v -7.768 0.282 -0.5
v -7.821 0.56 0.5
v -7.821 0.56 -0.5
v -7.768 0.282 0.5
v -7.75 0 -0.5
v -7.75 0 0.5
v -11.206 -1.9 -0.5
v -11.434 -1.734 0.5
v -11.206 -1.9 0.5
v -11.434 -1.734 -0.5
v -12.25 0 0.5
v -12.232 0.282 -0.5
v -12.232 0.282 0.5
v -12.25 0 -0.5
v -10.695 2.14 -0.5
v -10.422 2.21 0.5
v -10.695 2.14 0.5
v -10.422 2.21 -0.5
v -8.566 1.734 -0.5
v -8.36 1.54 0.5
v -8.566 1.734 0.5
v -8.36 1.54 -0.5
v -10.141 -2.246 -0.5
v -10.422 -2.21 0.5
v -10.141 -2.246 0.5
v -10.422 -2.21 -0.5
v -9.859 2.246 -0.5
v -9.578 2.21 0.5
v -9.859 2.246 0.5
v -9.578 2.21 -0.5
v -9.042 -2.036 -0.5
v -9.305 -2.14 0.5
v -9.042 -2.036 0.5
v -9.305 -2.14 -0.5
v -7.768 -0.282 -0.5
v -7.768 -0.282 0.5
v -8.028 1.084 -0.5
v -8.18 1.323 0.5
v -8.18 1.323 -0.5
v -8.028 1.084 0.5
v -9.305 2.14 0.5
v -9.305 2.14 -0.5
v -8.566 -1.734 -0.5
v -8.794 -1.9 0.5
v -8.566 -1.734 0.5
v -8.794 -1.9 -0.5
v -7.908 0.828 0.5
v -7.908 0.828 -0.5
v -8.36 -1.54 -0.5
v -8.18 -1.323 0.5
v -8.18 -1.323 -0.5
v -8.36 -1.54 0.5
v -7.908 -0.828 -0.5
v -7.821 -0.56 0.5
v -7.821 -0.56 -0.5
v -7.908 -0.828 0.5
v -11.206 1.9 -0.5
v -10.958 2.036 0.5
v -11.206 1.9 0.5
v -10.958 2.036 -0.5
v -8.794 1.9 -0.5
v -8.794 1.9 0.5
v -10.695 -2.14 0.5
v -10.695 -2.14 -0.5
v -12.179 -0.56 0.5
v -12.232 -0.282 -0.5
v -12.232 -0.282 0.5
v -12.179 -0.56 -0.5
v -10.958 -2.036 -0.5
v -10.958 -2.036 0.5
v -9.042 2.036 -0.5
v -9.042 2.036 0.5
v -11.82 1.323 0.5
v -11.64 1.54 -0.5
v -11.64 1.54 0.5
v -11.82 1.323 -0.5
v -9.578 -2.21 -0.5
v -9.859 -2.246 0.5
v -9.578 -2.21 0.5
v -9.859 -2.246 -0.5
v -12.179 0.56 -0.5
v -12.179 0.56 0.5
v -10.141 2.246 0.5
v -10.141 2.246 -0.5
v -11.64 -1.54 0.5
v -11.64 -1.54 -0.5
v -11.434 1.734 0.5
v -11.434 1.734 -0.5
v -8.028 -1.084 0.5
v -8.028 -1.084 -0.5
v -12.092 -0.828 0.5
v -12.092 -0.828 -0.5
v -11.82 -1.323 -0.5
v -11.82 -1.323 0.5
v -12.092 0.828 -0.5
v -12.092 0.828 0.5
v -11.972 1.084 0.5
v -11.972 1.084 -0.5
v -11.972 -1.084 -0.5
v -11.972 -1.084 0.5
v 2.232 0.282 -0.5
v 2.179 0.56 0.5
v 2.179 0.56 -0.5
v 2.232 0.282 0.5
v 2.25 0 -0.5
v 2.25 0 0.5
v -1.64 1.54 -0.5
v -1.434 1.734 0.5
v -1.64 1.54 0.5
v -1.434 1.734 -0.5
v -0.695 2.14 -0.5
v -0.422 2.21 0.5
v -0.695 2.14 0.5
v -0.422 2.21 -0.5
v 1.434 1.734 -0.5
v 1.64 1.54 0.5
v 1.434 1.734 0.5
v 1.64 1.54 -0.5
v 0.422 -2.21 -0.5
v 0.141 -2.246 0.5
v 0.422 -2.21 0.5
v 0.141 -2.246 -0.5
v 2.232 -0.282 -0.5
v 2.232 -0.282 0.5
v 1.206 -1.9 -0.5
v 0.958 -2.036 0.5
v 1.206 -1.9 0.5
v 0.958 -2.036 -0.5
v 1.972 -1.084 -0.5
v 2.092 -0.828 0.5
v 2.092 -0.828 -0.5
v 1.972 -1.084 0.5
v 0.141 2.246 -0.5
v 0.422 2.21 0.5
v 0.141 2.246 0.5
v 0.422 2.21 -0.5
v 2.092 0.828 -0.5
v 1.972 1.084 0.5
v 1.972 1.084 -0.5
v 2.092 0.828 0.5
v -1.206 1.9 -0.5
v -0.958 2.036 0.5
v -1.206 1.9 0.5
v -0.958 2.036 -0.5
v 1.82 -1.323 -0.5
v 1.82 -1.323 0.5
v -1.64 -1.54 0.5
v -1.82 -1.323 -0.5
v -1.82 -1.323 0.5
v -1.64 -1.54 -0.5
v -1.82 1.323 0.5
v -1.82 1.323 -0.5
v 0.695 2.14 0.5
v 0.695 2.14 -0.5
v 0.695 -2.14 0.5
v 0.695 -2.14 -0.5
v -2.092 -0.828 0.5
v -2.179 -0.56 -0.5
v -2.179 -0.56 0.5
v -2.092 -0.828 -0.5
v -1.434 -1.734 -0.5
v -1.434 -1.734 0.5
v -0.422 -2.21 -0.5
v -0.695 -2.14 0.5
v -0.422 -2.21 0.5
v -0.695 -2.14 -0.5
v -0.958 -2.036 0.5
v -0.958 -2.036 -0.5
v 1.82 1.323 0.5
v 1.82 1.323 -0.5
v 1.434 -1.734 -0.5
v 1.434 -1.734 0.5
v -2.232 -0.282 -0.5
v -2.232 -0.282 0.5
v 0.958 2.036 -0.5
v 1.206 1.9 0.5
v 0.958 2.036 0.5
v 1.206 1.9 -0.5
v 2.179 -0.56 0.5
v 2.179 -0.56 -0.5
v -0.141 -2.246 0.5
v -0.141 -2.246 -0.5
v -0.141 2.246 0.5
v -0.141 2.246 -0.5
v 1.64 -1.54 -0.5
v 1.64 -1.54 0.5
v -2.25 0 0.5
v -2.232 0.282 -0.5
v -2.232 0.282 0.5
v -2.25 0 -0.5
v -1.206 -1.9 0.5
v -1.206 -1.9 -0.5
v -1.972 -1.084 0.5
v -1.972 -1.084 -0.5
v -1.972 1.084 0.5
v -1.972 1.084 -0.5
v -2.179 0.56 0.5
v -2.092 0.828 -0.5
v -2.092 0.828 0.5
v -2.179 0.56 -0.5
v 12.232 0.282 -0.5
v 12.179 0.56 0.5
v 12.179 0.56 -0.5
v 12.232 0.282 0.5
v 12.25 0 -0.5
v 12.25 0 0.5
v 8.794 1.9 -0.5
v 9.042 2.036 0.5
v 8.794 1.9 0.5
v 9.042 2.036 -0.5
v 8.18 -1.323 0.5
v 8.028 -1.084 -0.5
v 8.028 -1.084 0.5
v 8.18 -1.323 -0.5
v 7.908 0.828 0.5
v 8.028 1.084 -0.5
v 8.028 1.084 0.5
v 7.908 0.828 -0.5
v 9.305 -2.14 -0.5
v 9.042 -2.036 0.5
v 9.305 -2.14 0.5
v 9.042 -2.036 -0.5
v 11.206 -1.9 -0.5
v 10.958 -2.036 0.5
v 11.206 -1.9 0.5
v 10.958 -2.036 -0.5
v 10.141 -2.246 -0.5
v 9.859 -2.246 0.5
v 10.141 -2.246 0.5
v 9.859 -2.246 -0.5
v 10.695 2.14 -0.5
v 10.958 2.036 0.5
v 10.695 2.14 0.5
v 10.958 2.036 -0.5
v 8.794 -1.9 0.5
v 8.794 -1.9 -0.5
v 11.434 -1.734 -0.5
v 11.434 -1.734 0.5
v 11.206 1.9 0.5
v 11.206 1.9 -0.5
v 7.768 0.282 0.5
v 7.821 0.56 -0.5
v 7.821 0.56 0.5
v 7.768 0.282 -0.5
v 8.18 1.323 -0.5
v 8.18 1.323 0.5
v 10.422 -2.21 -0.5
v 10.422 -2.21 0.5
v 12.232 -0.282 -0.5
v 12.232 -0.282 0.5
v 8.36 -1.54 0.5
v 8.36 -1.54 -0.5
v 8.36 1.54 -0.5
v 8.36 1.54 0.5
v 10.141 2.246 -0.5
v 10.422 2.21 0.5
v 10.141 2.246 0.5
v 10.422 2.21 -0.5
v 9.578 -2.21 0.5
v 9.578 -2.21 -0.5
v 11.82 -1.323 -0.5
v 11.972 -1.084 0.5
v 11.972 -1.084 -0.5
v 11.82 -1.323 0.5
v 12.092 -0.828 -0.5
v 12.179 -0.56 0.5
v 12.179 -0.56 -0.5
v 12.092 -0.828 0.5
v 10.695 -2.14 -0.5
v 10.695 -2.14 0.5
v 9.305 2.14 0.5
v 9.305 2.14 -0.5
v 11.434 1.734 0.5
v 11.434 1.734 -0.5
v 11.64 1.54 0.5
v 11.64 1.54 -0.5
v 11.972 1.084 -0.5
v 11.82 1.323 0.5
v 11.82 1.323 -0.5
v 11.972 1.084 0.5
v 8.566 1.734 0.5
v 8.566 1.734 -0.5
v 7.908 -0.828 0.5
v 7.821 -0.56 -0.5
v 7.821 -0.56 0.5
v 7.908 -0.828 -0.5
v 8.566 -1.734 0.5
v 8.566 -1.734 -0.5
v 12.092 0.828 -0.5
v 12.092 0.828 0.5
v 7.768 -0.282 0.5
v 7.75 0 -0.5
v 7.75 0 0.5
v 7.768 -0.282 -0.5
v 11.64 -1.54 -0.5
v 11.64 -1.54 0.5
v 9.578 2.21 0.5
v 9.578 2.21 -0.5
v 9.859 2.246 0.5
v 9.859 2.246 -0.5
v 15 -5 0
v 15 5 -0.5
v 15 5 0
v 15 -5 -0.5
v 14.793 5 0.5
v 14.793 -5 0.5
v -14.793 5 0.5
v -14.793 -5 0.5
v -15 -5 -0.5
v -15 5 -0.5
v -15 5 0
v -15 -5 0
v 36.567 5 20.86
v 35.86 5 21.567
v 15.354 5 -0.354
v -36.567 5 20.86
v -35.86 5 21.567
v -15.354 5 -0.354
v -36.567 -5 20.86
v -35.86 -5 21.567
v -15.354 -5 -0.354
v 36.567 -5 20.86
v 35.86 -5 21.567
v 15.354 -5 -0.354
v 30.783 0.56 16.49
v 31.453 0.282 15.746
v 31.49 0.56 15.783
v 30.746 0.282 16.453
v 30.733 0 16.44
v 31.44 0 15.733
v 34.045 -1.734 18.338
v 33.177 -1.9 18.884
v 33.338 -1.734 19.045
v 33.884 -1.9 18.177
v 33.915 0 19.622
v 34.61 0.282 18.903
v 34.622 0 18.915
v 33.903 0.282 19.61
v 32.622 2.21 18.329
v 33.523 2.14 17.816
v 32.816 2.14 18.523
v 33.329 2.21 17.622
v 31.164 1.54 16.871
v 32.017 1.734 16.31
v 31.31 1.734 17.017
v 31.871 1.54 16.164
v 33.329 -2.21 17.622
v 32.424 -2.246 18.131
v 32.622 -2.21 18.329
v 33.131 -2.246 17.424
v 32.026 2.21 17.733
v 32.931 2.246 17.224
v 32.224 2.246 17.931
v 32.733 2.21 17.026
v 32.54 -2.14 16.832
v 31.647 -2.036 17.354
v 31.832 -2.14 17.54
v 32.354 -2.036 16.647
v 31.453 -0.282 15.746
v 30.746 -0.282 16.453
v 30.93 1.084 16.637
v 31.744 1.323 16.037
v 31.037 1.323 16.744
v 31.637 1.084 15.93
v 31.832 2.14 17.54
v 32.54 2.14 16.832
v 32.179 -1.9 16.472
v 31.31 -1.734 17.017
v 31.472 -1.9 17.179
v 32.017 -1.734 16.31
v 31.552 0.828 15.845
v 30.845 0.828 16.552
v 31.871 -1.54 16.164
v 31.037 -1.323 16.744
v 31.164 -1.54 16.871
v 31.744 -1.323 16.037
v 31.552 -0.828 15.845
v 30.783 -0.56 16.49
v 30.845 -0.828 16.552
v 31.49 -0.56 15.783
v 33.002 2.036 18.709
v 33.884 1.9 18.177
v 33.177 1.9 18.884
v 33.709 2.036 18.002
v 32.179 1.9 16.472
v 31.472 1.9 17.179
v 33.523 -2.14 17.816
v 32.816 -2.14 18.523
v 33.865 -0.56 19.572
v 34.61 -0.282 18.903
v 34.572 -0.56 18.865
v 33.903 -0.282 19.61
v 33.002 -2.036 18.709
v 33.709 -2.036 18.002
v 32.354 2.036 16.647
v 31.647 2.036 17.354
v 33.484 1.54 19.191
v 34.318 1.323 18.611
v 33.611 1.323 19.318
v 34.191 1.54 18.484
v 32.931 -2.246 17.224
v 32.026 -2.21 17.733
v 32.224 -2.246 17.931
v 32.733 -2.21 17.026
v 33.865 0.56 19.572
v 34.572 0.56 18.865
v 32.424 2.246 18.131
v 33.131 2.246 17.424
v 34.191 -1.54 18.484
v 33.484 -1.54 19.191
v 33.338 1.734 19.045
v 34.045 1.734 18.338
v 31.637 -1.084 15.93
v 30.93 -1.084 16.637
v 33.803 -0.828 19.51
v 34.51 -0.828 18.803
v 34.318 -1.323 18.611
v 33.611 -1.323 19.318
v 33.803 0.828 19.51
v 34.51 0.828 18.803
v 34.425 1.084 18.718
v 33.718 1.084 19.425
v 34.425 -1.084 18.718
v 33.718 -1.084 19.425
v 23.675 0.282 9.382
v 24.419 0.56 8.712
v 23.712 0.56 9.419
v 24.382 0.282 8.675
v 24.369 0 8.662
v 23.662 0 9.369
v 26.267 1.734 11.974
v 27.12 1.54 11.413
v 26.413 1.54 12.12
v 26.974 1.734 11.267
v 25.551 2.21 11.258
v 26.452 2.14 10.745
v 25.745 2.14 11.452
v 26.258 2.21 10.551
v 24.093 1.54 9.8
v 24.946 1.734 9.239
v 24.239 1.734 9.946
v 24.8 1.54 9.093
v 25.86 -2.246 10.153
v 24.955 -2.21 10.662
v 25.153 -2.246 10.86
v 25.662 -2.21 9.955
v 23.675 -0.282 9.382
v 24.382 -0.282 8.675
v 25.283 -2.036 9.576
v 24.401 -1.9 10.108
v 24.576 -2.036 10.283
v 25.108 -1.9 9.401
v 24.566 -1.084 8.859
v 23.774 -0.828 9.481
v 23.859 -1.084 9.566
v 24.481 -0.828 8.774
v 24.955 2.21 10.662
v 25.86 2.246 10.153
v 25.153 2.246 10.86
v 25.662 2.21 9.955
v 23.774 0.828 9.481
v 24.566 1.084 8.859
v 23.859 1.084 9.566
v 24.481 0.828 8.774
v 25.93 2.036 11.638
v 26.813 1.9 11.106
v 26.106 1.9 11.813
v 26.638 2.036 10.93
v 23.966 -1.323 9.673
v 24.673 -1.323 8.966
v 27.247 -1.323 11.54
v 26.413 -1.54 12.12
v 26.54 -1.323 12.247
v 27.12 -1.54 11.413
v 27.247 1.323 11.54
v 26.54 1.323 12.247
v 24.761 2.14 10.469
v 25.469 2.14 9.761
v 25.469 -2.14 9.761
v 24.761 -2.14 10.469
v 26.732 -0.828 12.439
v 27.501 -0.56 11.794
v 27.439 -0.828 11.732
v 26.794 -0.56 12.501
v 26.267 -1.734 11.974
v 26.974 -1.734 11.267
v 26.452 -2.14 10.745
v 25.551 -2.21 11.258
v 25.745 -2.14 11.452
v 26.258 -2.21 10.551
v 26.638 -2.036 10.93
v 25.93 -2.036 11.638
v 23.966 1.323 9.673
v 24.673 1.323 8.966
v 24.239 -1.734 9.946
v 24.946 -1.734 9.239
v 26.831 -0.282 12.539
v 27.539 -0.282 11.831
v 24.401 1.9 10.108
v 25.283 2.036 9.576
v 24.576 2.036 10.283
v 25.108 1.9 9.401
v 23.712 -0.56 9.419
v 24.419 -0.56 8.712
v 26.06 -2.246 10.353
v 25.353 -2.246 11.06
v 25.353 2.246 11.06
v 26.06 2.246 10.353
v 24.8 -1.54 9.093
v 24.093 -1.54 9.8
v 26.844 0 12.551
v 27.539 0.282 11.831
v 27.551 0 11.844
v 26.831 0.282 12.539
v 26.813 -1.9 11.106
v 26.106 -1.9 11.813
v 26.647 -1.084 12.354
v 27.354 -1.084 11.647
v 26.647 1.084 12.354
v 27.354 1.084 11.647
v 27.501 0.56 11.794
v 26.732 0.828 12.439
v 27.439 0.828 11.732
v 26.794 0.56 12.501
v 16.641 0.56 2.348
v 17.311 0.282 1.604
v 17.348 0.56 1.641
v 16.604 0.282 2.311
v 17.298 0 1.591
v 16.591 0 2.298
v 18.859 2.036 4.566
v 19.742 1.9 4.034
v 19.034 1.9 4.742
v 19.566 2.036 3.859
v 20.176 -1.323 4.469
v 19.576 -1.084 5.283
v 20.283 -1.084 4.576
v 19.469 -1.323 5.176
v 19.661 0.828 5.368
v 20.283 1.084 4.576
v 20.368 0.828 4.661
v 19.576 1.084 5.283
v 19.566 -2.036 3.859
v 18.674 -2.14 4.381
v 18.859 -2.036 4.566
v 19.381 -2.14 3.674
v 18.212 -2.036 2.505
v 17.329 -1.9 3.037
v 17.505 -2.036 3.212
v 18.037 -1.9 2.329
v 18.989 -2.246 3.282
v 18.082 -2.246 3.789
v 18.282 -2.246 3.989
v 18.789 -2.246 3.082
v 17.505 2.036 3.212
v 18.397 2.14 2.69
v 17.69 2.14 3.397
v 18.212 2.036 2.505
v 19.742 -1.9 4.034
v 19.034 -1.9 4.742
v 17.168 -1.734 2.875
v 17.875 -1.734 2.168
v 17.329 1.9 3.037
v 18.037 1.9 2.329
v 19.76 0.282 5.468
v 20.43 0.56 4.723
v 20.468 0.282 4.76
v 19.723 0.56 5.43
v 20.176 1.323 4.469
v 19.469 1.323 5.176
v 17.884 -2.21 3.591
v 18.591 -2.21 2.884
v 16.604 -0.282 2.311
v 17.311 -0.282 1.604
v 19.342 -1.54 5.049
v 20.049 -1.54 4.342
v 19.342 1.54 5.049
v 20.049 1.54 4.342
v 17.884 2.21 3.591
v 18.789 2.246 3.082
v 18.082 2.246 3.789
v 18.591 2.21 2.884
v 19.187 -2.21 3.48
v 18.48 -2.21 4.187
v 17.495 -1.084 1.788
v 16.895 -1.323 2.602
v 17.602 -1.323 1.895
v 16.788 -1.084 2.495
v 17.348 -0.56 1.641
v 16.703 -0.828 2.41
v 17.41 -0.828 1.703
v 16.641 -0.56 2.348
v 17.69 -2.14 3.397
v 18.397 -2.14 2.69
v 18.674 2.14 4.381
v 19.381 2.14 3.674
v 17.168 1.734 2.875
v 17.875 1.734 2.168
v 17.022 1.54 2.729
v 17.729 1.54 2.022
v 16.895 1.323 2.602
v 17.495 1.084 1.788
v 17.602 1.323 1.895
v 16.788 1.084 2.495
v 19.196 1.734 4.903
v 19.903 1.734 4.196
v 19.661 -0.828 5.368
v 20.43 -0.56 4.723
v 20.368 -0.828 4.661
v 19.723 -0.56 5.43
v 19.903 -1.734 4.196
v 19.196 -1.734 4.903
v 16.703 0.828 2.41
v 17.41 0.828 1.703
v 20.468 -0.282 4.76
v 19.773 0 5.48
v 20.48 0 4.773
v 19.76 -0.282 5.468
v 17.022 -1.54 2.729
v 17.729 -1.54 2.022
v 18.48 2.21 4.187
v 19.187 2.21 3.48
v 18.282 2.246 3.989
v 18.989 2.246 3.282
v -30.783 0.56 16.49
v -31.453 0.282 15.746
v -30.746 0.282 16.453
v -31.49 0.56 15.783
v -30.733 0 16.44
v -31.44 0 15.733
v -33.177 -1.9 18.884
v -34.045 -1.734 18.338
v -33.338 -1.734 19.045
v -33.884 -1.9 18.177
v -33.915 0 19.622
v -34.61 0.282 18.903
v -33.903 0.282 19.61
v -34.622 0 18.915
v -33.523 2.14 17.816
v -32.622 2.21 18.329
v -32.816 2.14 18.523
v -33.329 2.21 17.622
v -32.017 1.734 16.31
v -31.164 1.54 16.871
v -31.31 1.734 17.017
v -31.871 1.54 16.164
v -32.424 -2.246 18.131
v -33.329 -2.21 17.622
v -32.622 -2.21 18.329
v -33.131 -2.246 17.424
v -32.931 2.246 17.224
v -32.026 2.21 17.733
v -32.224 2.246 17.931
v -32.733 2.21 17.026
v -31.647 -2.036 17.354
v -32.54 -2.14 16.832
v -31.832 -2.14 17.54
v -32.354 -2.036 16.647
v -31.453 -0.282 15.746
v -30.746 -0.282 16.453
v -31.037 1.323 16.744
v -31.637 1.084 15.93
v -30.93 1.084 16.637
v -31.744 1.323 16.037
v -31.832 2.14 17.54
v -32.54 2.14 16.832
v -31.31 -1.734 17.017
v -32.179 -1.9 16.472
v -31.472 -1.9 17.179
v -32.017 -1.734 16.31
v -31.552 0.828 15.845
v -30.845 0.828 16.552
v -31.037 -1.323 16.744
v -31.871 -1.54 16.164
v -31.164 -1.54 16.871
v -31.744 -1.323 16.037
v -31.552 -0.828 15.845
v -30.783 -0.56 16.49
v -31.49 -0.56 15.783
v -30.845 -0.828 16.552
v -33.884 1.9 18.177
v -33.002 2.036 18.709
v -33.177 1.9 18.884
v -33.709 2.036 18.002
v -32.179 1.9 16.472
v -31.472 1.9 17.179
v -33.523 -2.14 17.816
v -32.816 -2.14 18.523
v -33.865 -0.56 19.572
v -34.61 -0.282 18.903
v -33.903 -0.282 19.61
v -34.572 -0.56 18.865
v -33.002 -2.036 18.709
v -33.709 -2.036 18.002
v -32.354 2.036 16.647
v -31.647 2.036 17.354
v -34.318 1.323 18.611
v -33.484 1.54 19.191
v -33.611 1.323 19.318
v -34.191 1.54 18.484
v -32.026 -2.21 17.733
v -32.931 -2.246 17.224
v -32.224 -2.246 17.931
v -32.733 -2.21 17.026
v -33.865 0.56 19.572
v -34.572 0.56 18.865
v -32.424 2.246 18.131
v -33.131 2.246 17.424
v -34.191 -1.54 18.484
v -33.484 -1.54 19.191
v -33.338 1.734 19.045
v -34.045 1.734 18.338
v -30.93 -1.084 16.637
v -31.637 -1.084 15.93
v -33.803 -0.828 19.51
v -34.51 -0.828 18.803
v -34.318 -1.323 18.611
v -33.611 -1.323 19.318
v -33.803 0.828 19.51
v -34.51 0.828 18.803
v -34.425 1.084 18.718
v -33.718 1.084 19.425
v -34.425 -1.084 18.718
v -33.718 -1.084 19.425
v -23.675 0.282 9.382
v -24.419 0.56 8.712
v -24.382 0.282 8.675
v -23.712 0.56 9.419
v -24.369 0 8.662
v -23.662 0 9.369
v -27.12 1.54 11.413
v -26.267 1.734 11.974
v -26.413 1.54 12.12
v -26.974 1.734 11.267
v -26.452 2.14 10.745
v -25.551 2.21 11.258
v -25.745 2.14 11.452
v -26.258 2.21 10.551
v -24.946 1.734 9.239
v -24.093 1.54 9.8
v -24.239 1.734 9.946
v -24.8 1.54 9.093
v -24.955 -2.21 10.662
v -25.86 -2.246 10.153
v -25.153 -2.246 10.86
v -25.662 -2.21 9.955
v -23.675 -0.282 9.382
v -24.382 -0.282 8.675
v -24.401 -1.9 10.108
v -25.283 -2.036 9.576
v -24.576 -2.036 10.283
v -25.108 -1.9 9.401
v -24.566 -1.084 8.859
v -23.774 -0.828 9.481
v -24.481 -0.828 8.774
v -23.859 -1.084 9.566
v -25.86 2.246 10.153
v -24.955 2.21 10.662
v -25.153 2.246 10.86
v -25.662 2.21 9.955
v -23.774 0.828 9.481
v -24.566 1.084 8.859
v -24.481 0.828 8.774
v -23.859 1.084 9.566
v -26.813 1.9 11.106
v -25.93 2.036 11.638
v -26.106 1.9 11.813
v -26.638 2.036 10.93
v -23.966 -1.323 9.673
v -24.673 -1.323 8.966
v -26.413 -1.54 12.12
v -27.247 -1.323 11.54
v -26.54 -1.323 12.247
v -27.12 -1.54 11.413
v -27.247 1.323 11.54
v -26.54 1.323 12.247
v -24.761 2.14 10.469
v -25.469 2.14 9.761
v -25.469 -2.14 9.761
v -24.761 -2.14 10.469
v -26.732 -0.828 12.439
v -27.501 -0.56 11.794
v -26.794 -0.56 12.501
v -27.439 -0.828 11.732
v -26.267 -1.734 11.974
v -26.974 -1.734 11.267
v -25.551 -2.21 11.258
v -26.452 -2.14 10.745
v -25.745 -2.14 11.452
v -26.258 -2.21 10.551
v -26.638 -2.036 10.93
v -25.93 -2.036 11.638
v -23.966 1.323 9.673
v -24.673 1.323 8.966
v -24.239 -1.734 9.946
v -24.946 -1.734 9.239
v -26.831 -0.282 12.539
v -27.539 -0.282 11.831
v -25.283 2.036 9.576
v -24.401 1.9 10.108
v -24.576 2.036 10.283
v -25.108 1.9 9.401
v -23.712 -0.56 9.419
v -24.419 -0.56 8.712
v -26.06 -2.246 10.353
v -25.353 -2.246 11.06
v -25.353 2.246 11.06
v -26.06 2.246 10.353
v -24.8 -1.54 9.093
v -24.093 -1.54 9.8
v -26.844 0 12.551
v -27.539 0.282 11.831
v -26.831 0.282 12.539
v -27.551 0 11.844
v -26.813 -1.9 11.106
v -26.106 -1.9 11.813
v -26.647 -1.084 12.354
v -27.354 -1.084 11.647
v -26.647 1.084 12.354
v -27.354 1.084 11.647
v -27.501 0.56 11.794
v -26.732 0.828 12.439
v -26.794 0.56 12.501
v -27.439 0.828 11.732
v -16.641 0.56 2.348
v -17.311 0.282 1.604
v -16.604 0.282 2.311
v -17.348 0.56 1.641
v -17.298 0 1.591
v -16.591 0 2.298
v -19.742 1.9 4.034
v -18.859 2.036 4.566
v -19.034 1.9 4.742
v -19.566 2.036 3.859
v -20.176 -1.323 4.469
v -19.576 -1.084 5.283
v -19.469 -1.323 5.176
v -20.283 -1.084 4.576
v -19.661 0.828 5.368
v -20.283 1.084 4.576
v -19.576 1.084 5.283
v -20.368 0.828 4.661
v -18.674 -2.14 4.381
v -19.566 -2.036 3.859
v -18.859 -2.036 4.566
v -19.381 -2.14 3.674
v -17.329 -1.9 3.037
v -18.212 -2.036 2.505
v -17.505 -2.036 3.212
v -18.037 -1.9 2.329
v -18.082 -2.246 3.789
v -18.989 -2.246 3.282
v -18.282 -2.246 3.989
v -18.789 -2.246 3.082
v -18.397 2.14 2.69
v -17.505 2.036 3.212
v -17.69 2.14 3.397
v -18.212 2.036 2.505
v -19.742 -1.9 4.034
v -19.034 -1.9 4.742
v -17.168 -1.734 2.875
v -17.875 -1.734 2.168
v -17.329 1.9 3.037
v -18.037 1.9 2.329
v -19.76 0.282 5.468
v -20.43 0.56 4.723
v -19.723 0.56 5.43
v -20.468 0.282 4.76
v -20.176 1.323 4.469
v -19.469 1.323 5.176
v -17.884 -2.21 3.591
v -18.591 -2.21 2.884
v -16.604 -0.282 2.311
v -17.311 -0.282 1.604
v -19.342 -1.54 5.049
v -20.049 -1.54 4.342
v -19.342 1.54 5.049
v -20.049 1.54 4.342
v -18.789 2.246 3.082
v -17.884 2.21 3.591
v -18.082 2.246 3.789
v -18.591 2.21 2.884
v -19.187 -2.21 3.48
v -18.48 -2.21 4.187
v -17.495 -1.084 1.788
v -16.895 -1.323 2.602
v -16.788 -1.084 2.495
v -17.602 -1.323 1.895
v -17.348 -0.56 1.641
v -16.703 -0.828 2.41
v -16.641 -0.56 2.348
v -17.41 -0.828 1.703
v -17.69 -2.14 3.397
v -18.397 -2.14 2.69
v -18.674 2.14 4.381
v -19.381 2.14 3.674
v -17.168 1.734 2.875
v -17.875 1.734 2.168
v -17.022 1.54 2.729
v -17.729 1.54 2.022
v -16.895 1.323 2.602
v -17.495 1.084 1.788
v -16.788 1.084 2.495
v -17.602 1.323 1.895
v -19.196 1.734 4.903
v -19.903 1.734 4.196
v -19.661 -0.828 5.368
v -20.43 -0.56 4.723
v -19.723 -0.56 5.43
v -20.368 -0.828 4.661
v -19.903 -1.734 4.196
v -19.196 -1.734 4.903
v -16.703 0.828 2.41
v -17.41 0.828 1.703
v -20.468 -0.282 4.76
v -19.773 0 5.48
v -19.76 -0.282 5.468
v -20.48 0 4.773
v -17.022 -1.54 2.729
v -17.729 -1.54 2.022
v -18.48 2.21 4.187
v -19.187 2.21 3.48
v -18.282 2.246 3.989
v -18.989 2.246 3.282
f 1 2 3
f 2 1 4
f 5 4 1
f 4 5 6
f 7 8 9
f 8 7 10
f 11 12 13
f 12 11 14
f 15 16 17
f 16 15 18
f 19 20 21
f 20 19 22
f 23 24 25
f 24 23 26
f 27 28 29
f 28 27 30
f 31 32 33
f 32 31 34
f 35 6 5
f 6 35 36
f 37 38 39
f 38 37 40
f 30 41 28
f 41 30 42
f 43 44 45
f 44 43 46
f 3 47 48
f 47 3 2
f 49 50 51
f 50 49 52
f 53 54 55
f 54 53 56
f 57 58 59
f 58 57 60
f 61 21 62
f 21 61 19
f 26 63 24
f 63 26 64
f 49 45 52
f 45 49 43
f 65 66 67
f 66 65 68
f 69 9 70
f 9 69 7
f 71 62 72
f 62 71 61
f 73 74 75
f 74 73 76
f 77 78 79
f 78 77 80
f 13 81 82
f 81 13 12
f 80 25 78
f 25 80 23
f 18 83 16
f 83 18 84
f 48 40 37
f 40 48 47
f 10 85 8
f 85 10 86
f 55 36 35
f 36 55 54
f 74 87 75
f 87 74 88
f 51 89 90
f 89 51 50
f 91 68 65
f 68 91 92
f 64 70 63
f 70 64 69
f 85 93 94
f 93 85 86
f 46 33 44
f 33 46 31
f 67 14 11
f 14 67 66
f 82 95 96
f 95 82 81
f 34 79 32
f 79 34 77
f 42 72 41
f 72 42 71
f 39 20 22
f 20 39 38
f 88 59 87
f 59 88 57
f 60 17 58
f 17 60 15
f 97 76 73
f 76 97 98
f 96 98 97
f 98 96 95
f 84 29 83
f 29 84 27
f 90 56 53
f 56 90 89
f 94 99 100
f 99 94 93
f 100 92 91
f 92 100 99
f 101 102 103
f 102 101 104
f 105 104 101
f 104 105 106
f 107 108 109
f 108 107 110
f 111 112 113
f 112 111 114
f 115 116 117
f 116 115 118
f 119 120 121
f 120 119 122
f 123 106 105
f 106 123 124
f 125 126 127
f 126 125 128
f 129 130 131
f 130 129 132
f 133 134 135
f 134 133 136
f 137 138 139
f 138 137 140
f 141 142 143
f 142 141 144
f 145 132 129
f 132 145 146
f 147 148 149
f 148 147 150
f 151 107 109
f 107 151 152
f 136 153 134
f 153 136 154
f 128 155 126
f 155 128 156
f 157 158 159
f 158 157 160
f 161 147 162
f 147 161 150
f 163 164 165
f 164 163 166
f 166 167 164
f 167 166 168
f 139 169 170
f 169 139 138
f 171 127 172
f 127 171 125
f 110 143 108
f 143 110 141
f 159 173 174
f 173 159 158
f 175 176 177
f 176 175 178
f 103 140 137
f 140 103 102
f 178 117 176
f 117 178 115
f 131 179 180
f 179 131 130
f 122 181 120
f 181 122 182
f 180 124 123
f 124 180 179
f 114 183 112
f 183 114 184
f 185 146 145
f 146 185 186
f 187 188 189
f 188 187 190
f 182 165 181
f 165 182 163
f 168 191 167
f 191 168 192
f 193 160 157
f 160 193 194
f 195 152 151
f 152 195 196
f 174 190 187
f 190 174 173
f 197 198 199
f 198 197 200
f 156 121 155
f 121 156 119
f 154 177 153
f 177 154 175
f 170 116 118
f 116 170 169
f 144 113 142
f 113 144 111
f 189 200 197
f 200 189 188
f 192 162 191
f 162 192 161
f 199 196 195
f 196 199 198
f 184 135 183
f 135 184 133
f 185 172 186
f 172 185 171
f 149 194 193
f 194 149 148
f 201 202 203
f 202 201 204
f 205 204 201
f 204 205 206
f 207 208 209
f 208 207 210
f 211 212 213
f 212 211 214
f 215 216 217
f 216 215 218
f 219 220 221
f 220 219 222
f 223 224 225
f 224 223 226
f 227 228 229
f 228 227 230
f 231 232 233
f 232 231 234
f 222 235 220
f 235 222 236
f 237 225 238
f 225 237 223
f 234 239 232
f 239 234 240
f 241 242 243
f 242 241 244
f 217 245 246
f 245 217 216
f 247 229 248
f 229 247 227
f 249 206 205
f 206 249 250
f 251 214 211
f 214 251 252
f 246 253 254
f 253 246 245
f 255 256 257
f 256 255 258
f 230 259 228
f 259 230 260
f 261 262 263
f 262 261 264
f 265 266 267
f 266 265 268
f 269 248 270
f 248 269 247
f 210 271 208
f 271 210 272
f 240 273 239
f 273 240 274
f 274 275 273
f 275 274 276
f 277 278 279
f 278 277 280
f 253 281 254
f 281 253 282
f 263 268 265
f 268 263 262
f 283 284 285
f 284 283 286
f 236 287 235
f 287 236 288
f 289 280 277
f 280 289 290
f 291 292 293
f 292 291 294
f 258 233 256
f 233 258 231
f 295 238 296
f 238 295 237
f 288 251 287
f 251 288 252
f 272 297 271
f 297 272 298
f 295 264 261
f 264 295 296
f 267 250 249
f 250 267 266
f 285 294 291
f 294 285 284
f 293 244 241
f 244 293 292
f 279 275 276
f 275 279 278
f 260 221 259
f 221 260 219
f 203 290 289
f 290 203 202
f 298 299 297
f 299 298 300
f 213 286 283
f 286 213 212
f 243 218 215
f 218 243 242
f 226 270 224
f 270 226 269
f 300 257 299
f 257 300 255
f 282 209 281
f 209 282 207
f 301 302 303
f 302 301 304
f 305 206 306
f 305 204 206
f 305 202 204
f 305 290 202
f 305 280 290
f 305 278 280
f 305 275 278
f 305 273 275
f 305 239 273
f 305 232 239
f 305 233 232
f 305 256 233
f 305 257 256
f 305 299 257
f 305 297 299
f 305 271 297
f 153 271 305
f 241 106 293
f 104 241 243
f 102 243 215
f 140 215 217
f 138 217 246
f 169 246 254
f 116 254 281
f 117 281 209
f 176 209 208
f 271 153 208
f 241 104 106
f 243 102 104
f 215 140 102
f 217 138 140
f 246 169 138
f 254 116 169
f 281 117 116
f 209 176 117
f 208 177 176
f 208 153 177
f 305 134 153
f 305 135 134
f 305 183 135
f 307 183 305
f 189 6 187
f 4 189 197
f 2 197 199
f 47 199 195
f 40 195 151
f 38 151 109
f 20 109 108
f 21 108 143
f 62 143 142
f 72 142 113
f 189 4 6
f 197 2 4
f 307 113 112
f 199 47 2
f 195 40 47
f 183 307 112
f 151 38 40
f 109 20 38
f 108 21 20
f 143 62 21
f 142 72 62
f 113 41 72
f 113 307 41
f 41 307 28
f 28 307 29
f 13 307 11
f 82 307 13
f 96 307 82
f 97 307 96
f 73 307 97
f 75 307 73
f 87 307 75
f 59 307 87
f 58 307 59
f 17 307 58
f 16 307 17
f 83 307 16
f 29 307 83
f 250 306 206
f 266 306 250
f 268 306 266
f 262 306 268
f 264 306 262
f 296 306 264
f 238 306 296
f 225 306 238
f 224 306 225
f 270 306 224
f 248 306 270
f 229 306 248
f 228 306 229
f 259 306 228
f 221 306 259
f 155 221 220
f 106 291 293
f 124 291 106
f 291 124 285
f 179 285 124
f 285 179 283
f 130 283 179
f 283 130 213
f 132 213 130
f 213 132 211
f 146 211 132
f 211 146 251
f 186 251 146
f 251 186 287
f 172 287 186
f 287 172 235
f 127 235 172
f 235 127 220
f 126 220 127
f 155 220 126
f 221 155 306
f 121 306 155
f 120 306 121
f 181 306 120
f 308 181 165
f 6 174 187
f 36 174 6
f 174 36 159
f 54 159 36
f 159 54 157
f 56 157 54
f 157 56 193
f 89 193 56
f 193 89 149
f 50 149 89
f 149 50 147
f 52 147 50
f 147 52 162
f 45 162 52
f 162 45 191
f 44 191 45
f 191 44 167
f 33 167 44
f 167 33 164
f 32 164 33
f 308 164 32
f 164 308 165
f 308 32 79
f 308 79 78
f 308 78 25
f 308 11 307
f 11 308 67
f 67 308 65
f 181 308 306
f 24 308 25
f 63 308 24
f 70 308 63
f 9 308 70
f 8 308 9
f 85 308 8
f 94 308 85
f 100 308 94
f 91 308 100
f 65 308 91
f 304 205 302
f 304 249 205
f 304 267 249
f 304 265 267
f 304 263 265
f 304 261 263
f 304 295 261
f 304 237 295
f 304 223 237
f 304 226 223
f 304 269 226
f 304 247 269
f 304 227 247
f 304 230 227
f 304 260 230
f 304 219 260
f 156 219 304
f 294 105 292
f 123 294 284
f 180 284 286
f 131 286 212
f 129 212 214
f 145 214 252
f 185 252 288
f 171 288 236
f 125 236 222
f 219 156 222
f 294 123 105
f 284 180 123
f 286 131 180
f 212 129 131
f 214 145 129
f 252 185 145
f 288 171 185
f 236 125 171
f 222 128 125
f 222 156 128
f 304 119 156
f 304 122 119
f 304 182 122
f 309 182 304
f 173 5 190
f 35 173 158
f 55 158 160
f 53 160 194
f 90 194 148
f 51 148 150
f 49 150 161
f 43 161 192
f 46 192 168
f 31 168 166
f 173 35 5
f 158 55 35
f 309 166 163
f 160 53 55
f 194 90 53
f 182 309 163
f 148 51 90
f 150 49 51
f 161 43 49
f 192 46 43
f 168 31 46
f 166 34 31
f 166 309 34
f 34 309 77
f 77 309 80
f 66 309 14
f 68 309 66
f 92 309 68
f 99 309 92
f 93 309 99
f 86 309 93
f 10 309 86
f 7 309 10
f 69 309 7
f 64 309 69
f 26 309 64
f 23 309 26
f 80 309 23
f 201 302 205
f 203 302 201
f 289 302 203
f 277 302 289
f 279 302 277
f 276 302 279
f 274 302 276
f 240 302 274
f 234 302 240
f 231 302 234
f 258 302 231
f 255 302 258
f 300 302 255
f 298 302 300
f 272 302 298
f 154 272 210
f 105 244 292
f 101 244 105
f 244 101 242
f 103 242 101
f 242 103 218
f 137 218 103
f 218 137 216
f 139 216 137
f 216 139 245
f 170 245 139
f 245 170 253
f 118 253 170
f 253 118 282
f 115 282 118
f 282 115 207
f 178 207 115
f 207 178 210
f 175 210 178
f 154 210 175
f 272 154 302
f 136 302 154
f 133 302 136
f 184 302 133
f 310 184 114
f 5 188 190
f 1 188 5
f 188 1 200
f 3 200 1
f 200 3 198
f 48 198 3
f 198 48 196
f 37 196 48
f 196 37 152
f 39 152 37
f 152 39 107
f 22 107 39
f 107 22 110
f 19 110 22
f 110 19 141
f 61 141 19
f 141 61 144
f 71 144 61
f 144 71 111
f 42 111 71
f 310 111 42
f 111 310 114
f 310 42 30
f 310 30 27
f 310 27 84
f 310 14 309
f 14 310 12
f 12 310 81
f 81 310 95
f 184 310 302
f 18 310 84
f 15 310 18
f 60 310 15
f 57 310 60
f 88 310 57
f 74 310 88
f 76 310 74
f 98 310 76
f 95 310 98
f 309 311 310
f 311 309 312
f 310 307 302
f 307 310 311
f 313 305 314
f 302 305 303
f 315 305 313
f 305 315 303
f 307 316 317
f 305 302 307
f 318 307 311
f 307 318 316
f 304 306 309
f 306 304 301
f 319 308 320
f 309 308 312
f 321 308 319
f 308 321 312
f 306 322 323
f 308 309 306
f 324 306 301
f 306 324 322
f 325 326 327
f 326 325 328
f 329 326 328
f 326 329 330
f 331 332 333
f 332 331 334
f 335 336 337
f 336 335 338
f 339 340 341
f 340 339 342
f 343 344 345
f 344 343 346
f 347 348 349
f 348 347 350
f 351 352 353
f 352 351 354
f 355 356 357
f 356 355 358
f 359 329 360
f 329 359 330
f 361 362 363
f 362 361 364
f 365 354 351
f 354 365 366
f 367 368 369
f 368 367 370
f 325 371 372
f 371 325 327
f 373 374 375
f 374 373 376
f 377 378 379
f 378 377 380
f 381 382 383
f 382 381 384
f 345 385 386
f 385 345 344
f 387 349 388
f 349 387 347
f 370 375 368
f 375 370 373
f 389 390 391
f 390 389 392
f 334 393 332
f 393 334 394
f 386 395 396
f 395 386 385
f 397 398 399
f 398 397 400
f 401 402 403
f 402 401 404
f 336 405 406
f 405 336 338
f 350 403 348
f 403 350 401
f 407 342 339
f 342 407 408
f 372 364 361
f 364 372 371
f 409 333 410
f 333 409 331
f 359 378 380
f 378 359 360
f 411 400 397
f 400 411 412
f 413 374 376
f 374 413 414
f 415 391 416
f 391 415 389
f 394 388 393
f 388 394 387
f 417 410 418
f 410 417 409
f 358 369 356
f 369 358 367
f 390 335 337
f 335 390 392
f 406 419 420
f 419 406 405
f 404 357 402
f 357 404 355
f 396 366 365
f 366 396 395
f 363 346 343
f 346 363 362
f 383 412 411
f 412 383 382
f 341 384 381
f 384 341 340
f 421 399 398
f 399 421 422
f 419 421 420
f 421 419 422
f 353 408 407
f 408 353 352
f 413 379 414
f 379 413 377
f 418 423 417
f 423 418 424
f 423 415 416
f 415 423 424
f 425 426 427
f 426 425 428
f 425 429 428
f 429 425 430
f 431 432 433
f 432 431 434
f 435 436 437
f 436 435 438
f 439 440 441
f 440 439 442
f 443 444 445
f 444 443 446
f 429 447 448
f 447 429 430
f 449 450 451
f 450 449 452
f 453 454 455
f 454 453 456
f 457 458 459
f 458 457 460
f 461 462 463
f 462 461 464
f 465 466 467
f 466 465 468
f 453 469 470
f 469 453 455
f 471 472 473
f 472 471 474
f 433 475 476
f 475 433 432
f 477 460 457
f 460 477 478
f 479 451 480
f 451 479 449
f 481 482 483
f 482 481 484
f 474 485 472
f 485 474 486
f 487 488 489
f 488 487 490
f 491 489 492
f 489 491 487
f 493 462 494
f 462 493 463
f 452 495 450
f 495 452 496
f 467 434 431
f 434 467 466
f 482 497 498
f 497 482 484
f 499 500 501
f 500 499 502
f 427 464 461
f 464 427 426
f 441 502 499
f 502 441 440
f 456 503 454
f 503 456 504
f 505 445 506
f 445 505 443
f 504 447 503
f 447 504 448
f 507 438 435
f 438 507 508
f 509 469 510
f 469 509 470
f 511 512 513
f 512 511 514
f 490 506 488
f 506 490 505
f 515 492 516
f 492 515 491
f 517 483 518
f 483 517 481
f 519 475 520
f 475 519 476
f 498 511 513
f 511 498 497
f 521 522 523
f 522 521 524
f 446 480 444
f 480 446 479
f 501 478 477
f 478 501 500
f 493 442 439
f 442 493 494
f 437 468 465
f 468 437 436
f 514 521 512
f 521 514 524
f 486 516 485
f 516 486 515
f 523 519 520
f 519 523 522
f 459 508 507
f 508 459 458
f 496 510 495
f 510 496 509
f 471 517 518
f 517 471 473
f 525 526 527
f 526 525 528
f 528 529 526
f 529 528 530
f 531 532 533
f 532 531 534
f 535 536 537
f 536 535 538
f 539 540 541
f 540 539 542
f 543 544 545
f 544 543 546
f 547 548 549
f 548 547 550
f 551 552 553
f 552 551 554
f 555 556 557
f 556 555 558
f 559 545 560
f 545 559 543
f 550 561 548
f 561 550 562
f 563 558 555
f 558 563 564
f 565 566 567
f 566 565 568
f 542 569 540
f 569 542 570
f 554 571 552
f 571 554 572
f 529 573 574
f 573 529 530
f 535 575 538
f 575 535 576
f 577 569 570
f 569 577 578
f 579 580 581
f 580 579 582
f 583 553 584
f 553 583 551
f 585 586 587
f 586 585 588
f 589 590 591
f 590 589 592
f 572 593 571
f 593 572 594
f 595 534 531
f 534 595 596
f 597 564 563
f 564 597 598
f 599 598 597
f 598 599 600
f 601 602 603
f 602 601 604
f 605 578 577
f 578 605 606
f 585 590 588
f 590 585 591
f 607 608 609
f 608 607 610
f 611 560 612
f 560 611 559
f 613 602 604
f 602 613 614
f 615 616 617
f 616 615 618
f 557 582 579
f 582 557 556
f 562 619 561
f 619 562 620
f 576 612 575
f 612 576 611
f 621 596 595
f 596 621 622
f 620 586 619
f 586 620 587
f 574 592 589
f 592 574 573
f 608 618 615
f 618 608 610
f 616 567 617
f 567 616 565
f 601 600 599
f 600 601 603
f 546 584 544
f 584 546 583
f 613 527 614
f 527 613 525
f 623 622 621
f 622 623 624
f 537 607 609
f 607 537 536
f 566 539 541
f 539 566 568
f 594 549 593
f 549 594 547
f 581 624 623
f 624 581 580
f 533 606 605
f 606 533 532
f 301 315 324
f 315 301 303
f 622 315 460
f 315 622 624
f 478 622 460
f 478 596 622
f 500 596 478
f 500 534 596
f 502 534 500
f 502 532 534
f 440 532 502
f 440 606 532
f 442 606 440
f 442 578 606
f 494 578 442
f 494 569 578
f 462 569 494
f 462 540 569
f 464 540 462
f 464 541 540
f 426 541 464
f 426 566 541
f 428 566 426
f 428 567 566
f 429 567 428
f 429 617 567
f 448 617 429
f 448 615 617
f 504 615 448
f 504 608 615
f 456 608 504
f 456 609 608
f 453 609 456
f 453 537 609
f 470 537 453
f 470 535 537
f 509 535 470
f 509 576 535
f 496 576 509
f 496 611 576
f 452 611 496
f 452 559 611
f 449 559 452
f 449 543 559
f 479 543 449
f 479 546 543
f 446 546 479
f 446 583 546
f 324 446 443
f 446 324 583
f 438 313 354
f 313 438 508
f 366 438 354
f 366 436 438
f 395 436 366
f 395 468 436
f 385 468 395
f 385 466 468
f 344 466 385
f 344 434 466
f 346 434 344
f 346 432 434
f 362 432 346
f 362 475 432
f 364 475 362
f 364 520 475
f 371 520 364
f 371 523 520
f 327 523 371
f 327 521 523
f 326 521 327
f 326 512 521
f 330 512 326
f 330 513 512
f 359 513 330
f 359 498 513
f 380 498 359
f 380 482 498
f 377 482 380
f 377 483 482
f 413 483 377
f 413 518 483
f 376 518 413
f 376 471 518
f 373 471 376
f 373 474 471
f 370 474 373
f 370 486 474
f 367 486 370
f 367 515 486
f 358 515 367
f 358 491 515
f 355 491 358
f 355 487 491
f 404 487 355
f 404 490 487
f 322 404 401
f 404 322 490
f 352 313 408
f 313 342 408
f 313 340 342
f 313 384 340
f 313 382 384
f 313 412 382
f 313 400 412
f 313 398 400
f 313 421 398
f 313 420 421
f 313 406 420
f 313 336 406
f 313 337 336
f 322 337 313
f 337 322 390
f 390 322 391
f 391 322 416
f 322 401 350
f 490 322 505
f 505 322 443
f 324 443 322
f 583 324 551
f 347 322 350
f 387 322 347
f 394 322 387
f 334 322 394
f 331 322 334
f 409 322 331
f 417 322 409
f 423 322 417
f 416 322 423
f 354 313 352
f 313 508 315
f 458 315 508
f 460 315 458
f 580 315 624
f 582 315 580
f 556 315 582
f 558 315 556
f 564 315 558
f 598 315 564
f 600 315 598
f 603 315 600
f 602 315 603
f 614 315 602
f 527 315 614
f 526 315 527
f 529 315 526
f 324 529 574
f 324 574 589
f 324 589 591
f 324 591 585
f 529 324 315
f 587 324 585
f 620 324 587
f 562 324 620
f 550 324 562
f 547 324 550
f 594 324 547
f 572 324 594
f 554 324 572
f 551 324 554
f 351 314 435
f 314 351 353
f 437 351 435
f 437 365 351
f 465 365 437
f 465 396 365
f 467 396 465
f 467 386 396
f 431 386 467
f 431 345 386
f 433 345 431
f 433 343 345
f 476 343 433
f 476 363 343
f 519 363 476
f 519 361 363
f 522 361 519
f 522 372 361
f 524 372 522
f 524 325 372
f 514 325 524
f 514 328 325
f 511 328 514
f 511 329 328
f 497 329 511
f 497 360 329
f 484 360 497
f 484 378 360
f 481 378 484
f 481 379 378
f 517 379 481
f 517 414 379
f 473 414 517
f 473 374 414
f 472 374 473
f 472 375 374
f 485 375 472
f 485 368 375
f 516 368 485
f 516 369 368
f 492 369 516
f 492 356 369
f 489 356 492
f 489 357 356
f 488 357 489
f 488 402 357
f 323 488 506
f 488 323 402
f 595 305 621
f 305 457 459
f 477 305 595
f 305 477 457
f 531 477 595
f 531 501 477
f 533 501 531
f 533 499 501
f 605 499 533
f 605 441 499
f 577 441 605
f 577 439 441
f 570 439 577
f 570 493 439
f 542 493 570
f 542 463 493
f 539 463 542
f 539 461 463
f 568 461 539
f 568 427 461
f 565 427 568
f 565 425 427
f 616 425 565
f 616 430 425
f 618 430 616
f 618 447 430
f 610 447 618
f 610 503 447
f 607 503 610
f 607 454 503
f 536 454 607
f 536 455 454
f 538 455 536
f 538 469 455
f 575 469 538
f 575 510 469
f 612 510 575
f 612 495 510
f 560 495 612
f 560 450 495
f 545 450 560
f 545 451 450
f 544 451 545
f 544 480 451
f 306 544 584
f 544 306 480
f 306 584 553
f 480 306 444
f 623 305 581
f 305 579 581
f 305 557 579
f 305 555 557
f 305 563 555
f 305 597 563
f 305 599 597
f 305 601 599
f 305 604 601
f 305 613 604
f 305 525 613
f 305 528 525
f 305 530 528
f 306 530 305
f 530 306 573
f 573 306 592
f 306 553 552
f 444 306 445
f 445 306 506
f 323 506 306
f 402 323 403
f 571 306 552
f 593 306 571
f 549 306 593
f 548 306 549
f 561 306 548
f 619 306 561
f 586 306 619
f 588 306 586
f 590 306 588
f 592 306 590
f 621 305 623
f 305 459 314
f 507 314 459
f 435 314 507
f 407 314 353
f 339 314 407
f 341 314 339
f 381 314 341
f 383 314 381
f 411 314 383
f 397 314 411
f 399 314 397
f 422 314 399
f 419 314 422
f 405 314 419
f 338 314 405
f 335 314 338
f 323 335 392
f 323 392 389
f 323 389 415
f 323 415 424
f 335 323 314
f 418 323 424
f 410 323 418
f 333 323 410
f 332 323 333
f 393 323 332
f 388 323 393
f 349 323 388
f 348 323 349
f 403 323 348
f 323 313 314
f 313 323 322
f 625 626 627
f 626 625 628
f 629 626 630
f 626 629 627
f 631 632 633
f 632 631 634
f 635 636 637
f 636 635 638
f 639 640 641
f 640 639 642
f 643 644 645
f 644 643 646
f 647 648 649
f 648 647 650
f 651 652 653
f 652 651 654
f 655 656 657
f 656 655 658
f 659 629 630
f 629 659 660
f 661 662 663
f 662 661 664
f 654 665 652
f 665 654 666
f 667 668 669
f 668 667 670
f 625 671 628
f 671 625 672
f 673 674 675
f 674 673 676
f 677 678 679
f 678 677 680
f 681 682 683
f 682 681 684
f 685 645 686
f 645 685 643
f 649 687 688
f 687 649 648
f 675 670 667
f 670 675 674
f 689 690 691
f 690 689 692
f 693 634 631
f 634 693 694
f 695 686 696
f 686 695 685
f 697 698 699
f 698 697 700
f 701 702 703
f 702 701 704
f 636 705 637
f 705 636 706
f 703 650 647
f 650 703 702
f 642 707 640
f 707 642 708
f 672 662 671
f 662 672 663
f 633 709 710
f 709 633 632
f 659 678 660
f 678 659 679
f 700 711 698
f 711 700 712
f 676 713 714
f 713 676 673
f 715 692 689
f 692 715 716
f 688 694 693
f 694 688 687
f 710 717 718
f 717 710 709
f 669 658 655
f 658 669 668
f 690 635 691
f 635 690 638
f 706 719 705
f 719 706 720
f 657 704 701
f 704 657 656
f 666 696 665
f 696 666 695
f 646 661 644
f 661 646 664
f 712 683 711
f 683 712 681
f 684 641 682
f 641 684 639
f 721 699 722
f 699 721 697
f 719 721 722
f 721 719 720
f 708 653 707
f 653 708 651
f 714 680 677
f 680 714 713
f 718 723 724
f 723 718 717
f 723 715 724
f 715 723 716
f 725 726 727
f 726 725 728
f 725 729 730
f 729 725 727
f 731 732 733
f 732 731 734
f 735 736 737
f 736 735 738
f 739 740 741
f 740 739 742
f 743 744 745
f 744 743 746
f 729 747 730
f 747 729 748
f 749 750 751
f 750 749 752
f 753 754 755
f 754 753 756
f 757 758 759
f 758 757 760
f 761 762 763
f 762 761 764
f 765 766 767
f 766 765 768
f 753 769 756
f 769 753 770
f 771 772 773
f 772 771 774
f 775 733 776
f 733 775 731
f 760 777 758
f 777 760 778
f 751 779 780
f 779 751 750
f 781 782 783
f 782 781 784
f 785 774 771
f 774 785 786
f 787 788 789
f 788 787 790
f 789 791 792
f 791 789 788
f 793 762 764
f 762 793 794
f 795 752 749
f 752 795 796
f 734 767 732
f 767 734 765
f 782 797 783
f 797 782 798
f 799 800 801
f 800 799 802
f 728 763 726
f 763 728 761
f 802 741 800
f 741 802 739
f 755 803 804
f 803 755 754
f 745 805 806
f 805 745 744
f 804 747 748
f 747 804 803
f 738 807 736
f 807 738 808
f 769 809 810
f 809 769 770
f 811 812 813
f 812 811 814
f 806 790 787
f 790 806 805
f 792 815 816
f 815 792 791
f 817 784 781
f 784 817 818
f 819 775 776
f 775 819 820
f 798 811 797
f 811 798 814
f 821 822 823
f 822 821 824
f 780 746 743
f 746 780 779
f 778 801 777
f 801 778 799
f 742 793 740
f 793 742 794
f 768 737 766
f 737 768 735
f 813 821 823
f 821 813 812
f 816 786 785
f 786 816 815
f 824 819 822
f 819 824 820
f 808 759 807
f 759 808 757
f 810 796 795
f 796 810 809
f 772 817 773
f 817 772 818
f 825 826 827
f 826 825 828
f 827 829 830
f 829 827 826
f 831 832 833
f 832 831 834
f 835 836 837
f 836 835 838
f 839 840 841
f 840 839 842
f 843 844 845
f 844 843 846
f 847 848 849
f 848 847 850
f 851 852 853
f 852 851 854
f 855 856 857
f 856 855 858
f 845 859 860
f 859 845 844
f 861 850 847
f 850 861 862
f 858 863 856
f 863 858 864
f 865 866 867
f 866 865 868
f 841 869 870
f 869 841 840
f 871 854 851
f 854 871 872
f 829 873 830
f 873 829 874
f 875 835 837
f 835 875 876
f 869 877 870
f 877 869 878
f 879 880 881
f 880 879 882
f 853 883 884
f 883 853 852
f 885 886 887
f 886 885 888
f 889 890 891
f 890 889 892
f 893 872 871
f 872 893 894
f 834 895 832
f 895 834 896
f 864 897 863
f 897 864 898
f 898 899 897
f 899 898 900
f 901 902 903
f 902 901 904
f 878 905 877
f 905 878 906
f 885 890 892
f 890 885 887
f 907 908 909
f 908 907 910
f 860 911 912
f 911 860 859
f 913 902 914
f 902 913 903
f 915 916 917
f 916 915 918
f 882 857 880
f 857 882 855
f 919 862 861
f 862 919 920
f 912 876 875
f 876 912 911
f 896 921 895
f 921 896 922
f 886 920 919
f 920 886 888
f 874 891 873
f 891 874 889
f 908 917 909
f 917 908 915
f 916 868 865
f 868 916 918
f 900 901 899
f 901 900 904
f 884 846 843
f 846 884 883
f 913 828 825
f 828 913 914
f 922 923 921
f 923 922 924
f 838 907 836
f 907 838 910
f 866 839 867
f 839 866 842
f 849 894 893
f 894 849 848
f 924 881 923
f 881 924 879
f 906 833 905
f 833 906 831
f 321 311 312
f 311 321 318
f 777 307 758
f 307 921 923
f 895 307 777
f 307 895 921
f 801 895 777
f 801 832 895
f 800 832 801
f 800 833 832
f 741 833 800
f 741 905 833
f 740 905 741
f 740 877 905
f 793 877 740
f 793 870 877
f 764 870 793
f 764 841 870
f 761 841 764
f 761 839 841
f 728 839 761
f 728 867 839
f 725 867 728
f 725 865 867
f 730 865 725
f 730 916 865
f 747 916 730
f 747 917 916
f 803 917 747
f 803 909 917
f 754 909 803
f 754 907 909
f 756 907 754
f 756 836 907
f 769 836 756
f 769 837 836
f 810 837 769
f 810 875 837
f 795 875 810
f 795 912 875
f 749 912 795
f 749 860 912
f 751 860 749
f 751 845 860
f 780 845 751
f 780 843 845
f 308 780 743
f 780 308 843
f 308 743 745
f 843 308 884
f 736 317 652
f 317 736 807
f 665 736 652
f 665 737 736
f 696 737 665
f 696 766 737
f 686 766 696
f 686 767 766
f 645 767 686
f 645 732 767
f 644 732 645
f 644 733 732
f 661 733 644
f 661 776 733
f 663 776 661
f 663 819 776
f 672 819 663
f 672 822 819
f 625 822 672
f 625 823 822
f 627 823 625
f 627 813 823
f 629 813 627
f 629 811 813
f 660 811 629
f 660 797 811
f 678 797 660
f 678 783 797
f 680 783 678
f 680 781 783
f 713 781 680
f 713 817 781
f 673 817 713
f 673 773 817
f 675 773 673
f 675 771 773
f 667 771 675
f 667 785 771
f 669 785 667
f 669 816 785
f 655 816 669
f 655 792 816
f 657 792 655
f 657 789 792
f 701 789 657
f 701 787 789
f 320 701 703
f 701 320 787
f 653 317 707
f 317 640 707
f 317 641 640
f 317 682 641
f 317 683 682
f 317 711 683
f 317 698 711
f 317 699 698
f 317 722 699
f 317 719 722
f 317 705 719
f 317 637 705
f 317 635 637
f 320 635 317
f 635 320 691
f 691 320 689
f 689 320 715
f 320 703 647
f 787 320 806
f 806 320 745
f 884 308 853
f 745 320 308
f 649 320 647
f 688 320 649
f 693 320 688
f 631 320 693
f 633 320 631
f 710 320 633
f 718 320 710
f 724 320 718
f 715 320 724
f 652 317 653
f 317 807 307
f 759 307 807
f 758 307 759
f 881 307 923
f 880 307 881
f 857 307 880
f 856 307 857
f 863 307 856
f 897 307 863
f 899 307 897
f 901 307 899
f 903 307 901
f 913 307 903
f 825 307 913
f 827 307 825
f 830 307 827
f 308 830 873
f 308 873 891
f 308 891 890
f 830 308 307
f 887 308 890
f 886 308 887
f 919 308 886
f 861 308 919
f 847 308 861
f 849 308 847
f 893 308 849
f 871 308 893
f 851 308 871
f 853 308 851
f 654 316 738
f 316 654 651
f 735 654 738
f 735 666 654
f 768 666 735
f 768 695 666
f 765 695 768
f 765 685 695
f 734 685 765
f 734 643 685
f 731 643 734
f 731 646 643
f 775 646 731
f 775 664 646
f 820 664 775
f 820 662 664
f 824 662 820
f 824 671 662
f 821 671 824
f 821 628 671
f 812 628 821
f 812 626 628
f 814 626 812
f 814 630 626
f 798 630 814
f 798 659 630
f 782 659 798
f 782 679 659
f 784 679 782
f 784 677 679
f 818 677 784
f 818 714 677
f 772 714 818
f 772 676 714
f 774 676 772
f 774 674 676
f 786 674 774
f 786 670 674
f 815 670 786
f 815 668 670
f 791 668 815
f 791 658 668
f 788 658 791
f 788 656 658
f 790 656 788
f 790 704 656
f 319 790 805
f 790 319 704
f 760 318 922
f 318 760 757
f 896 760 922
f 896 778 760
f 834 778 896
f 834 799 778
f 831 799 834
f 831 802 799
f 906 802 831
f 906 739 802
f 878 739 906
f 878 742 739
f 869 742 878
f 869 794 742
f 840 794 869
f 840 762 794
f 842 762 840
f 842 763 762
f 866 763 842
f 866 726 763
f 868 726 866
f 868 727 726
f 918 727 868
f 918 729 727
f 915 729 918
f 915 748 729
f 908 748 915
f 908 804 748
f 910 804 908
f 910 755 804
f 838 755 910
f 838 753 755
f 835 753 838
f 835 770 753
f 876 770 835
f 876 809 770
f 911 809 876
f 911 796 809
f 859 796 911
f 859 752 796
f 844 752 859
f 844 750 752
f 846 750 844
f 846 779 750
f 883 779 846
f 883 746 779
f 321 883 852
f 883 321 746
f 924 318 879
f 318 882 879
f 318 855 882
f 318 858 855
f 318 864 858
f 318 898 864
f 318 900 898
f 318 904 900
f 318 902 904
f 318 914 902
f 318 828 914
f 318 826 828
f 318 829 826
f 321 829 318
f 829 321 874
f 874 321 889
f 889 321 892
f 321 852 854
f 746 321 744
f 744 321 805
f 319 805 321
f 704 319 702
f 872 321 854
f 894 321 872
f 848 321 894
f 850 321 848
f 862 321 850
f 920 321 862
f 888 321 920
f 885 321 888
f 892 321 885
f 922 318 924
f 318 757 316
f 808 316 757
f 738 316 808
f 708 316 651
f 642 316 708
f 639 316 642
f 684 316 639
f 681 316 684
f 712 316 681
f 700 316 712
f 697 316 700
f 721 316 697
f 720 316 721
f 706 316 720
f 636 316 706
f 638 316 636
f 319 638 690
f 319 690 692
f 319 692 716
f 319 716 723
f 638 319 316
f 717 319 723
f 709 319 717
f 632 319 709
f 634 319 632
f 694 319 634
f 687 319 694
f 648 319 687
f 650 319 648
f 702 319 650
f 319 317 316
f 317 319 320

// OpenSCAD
module Meccano(size,hole){
    difference(){
        cube(size, center=true);
        cylinder(h=10,r=hole/2, center=true, $fn=50);
        for(j= [-size[0]:10:size[0]])
        for(i= [-size[1]:10:size[1]]){
        translate([j,i,0])
        cylinder(h=size[2]+1,r=hole/2, center=true, $fn=50);
        }    
        
    }    
}

module MeccanoL(size,hole){
   Meccano(size, hole);
   translate([size[0]/2,0,size[0]/2])
   rotate([0,90,0])
   Meccano(size, hole); 
}
module MeccanoY(size,hole){
   Meccano(size, hole);
   translate([(size[0]/2)*sin(45)+size[0]/2,0,size[0]/2*sin(45)])
   rotate([0,135,0])
   Meccano(size, hole); 
}
module MeccanoC(size,hole){
   Meccano(size, hole);
   translate([(size[0]/2)*sin(45)+size[0]/2,0,size[0]/2*sin(45)])
   rotate([0,135,0])
   Meccano(size, hole); 
   translate([(size[0]/2)*-sin(45)-size[0]/2,0,size[0]/2*sin(45)])
   rotate([0,45,0])
   Meccano(size, hole); 
}
MeccanoC([30,10,1], 4.5);
